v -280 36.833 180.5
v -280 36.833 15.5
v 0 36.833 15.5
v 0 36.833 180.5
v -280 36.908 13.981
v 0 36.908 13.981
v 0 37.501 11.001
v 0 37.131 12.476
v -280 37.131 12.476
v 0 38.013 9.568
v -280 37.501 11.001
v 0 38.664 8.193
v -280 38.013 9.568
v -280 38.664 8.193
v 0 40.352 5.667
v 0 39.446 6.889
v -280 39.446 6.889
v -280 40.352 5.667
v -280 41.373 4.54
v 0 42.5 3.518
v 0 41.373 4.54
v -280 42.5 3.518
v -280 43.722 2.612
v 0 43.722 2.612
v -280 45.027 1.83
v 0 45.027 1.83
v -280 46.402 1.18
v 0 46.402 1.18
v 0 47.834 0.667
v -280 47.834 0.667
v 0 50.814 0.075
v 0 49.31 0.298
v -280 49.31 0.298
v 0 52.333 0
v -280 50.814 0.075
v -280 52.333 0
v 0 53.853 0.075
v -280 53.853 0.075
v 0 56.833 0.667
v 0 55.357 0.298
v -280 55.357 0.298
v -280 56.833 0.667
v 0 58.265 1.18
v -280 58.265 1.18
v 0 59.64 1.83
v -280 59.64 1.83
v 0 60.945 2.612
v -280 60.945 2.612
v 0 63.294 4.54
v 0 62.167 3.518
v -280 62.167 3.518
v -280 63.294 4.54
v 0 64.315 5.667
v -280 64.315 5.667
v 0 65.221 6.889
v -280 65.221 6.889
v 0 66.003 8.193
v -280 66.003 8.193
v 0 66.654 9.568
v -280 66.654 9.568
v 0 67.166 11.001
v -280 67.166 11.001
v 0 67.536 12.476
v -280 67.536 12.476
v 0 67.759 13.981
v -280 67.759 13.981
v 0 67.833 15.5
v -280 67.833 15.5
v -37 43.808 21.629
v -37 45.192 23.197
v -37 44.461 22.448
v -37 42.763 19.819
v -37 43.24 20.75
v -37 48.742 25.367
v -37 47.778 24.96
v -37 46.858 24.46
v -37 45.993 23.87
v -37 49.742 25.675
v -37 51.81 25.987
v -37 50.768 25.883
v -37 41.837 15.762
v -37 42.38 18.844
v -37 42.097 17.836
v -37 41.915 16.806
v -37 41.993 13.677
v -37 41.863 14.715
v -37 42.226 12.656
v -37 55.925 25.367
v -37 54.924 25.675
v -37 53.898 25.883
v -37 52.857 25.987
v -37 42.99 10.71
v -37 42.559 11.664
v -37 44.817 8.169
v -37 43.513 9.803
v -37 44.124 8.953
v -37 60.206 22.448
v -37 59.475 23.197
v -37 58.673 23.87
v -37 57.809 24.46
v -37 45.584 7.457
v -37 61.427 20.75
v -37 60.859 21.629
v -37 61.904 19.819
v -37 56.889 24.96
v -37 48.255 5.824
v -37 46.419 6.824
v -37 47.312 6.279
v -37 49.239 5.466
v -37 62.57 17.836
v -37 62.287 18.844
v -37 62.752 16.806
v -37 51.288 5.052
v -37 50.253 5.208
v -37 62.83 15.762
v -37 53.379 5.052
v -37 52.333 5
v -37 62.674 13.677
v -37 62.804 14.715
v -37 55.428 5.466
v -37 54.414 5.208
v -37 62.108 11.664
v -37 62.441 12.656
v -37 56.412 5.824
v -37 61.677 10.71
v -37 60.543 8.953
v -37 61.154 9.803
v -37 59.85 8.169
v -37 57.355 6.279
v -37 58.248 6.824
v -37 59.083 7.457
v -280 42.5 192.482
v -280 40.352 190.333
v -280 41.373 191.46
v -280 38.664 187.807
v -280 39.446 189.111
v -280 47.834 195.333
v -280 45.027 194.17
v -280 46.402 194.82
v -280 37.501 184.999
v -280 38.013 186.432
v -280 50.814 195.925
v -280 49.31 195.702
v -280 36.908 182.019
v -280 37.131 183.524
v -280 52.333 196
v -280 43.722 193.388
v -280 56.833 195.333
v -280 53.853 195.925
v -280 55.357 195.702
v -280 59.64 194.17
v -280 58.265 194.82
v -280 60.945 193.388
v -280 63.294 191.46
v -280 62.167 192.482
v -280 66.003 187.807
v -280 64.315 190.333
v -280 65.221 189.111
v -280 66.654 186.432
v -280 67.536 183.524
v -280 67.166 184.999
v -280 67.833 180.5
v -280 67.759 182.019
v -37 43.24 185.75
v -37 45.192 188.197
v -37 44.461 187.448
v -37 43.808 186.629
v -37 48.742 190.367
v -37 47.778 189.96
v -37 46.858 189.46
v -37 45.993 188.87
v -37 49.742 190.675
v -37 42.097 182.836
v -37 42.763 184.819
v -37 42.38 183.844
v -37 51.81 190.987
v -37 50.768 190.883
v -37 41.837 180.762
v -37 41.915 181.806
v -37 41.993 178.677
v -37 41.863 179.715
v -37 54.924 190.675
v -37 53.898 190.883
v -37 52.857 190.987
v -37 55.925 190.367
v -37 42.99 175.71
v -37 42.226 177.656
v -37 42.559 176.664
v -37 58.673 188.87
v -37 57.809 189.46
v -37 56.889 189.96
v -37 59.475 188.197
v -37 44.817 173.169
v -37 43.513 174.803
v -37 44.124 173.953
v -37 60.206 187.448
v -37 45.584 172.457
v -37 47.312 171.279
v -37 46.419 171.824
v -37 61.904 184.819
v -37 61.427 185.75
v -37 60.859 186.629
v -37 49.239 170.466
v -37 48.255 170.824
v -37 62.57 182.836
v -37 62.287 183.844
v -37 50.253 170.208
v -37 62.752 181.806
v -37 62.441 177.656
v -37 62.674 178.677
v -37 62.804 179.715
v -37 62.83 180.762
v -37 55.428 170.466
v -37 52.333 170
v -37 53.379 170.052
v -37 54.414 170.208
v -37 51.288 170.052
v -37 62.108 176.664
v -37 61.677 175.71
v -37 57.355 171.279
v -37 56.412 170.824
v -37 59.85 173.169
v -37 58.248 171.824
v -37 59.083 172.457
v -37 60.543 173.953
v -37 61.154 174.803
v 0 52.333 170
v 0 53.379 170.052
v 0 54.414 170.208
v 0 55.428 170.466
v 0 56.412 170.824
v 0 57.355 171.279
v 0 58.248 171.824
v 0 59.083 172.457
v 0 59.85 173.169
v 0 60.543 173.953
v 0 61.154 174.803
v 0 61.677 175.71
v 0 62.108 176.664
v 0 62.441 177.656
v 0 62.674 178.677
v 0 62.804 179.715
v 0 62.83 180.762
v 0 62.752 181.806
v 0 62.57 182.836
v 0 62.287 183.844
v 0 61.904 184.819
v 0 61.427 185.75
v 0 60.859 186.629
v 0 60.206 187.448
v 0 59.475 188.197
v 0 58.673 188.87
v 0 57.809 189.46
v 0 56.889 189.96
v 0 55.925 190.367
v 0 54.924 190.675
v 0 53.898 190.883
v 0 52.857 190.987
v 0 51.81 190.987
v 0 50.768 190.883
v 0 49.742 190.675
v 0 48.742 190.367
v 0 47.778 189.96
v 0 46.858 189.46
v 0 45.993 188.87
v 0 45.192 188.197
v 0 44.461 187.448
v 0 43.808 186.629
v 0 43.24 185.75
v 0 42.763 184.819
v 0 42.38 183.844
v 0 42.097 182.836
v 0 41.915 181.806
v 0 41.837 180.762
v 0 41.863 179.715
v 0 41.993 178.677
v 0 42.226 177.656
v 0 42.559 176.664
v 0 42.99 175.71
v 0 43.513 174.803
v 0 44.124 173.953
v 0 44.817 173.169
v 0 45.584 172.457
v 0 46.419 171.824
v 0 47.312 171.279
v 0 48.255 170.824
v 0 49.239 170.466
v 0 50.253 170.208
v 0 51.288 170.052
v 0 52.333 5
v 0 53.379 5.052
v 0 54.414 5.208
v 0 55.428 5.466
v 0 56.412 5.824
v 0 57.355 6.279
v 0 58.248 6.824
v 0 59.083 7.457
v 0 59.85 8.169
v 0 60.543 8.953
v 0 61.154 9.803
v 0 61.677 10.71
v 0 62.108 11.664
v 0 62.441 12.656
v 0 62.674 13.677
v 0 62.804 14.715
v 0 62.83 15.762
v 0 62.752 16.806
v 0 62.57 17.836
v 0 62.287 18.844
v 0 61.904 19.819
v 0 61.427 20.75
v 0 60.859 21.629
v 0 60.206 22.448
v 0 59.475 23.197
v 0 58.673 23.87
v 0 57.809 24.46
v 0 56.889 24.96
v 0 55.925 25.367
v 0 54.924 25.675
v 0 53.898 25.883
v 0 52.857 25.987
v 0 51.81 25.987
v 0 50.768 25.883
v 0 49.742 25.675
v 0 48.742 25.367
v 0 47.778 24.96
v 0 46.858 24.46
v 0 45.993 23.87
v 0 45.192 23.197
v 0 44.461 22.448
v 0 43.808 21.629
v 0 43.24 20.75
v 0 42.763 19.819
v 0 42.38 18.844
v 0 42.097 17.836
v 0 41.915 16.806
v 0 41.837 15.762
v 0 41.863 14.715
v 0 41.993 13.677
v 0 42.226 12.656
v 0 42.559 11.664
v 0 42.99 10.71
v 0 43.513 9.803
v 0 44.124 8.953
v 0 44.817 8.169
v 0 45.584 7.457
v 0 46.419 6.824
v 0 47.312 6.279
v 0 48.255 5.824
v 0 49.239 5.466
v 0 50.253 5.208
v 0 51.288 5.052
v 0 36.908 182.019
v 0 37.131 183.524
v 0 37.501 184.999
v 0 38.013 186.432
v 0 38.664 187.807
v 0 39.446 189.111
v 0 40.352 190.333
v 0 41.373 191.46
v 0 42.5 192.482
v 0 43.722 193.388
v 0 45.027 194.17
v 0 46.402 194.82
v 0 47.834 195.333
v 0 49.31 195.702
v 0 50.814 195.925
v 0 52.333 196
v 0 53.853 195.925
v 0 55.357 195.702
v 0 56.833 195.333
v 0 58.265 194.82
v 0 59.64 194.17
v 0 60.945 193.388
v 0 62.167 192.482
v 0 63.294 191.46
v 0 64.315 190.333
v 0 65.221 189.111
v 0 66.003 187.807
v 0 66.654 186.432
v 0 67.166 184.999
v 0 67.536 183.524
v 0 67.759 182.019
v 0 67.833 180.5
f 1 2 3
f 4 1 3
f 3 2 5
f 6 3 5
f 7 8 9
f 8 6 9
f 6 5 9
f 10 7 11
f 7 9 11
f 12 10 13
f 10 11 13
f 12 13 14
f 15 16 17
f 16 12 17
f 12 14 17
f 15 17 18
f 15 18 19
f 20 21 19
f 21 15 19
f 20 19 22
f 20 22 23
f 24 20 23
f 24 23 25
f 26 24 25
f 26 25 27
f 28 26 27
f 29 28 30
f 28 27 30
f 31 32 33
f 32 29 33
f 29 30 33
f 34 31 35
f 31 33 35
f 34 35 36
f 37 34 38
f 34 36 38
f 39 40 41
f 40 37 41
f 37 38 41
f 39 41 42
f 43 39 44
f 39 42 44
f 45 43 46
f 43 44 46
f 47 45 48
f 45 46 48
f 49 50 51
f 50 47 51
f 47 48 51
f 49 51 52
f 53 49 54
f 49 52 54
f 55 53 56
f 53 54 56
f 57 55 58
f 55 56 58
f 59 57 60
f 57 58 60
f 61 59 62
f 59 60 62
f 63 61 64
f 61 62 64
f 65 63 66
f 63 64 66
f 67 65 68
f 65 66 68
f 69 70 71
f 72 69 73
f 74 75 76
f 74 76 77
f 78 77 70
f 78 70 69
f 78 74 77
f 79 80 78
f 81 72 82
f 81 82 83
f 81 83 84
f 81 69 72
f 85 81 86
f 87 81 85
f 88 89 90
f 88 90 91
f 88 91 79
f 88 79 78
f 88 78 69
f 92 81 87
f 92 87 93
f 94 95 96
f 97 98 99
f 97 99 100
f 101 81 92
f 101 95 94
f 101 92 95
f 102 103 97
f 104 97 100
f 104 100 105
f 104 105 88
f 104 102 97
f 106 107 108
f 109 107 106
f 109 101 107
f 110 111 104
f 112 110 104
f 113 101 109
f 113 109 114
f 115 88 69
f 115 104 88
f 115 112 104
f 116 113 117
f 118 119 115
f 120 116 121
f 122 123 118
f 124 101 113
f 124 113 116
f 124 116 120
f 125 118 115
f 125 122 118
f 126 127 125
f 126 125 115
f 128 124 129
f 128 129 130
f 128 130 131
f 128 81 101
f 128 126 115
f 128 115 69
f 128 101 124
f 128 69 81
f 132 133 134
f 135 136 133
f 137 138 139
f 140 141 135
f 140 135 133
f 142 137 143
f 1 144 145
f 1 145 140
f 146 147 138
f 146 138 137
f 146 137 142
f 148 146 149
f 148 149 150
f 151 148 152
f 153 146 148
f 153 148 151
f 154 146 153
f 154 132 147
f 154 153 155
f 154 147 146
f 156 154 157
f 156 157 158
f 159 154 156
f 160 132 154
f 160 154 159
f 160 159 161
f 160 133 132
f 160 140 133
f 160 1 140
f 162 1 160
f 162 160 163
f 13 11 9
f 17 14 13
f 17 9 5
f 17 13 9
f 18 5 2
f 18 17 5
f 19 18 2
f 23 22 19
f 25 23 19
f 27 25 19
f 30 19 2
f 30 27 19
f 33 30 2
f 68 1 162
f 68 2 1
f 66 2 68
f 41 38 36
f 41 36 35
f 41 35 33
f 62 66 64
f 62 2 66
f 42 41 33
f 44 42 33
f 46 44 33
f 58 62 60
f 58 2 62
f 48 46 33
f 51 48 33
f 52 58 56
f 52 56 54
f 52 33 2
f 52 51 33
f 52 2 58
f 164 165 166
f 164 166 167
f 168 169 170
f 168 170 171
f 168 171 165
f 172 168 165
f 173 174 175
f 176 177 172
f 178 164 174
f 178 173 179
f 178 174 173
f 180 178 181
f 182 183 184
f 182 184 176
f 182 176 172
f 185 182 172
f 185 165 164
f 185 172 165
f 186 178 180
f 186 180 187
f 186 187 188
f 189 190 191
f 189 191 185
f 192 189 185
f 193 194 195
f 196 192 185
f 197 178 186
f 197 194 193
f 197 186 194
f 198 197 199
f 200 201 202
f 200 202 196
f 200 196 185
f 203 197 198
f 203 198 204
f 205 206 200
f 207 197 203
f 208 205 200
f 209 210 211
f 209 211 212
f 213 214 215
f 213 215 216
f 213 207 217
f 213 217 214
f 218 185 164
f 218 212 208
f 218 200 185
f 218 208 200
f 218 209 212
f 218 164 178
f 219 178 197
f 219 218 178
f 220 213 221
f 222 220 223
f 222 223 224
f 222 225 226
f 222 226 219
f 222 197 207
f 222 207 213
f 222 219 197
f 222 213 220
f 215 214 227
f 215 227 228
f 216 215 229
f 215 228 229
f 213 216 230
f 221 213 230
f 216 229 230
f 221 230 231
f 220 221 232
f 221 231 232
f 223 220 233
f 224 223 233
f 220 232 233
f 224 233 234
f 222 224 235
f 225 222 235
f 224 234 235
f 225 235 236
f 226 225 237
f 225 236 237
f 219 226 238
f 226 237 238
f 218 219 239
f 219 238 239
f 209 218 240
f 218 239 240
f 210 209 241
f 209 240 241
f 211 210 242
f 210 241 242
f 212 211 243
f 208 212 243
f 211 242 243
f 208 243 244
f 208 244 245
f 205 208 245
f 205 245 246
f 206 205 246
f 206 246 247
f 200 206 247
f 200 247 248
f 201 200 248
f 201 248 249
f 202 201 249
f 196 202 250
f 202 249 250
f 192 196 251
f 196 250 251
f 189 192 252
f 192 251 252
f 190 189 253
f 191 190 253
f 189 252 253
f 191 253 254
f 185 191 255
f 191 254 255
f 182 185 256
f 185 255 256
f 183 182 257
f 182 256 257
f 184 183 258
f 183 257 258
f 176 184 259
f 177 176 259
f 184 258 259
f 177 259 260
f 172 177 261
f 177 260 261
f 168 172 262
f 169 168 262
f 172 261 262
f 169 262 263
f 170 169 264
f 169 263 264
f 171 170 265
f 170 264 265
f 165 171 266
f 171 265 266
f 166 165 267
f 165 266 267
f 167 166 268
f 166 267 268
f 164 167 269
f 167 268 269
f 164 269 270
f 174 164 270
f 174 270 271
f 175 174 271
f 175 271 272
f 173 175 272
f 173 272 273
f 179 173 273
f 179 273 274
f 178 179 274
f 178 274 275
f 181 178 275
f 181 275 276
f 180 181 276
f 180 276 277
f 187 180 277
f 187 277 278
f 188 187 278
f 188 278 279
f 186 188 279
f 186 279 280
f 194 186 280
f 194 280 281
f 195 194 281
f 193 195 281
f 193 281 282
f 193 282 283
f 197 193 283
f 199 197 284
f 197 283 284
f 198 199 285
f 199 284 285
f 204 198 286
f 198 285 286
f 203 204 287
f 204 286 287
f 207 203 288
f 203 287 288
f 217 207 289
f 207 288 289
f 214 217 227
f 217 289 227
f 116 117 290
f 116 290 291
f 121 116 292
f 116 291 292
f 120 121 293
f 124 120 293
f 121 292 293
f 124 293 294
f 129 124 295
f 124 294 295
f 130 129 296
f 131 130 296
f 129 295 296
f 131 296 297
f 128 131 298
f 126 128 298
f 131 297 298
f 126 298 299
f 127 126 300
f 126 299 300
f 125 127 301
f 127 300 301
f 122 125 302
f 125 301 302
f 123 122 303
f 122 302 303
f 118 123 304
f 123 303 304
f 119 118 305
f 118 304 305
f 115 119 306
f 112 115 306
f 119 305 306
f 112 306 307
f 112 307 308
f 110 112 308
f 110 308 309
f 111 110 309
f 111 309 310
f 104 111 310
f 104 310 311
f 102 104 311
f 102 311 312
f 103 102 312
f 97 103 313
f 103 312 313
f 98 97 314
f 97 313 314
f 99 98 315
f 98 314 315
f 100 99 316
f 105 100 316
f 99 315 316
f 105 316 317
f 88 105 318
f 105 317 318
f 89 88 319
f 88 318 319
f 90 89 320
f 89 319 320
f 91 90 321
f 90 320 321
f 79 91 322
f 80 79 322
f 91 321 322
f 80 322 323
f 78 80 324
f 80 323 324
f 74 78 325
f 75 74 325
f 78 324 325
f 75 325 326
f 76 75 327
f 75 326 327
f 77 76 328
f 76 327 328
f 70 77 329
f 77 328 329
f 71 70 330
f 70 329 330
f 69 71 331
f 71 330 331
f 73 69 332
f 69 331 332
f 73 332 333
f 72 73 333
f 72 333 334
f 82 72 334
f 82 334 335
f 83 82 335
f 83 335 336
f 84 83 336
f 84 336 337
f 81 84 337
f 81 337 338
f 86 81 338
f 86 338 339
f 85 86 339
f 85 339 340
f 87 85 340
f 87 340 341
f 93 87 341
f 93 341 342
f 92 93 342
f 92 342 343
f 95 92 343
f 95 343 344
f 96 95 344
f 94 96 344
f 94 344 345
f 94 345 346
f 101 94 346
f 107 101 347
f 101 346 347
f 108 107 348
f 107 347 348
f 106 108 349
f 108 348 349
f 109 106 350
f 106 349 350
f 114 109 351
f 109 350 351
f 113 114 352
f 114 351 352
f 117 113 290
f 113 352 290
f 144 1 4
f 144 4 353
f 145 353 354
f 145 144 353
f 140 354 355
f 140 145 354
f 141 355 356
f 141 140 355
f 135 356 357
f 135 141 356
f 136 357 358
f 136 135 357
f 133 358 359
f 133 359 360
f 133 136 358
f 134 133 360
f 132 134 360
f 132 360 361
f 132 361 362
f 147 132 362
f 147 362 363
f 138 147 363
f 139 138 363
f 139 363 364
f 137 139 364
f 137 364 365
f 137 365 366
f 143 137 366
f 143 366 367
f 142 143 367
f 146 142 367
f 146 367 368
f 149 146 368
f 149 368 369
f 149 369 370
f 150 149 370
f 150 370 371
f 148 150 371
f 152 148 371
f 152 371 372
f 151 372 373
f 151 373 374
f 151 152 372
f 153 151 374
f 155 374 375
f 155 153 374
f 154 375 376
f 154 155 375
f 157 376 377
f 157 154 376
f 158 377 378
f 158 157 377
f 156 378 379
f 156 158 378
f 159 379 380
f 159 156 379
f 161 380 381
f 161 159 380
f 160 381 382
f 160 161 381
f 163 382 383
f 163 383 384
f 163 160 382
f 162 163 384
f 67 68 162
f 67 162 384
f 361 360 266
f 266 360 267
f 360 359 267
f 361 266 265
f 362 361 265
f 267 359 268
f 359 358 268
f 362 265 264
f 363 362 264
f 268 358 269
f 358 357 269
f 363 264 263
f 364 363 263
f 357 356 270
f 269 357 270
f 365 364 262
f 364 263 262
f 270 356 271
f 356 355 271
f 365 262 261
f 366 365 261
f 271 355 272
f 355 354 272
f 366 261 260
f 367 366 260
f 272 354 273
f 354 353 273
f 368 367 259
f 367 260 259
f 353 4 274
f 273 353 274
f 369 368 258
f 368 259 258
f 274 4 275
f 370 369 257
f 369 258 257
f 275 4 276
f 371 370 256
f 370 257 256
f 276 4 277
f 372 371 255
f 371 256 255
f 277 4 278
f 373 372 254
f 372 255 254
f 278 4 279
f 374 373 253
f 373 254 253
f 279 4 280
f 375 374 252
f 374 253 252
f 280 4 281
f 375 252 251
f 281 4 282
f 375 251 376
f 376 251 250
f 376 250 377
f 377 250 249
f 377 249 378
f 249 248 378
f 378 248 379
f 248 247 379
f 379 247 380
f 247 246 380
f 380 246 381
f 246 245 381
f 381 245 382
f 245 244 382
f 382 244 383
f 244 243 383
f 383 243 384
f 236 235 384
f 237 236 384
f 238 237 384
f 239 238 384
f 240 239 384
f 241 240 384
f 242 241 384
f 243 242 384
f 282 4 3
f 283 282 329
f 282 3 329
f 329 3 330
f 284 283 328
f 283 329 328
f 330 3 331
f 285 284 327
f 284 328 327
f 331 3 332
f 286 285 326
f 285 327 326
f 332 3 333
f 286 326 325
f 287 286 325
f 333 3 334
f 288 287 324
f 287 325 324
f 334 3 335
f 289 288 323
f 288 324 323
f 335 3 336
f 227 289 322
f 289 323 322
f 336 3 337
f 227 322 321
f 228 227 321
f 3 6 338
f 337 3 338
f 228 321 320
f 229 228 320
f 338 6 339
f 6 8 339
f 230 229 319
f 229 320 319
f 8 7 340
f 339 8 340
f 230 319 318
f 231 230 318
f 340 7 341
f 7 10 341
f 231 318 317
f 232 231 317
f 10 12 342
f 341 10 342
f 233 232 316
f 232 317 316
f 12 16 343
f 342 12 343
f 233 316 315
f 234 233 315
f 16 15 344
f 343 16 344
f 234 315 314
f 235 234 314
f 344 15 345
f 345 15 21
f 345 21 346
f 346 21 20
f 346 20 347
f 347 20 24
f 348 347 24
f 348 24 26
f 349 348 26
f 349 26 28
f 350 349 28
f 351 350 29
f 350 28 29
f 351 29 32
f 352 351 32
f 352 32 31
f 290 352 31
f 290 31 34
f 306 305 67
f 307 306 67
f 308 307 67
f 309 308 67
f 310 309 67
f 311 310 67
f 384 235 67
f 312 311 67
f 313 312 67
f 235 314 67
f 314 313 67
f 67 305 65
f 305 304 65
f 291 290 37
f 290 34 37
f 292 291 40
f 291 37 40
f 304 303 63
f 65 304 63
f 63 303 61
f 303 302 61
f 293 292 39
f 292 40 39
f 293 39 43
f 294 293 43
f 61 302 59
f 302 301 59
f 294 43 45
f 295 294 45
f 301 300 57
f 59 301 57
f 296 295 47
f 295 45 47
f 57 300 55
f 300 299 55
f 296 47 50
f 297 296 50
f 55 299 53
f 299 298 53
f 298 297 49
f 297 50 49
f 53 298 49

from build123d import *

# Parameters (mm, degrees)
SKETCH3_W               = 280
SKETCH3_H               = 31
BOSS_EXTRUDE1_DEPTH     = 196
CUT_EXTRUDE1_DEPTH      = 349.449961347
CUT_EXTRUDE1_DEPTH_BACK = 349.449961347
SKETCH6_R               = 10.5
CUT_EXTRUDE2_DEPTH      = 37


with BuildPart() as part:
    # Sketch3 → Boss-Extrude1 (new body)
    with BuildSketch(Plane.XY):
        with Locations((-140, 52.333439857)):
            Rectangle(SKETCH3_W, SKETCH3_H)
    extrude(amount=BOSS_EXTRUDE1_DEPTH)

    # Sketch4 → Cut-Extrude1 (cut, two sides: drawn at the far end of the back side and taken through both)
    with BuildSketch(Plane(origin=(0, 0, 0), x_dir=(0, 0, -1), z_dir=(1, 0, 0)).offset(-CUT_EXTRUDE1_DEPTH_BACK)):
        with BuildLine():
            Line((-180.5, 67.833439857), (-180.5, 68.833439857))
            Line((-180.5, 68.833439857), (-197, 68.833439857))
            Line((-197, 68.833439857), (-197, 35.833439857))
            Line((-197, 35.833439857), (-180.5, 35.833439857))
            Line((-180.5, 35.833439857), (-180.5, 36.833439857))
            ThreePointArc((-180.5, 36.833439857), (-196, 52.333439857), (-180.5, 67.833439857))
        make_face()
        with BuildLine():
            Line((-15.5, 67.833439857), (-15.5, 68.833439857))
            Line((-15.5, 68.833439857), (1, 68.833439857))
            Line((1, 68.833439857), (1, 35.833439857))
            Line((1, 35.833439857), (-15.5, 35.833439857))
            Line((-15.5, 35.833439857), (-15.5, 36.833439857))
            ThreePointArc((-15.5, 36.833439857), (0, 52.333439857), (-15.5, 67.833439857))
        make_face()
    extrude(amount=CUT_EXTRUDE1_DEPTH + CUT_EXTRUDE1_DEPTH_BACK, mode=Mode.SUBTRACT)

    # Sketch6 → Cut-Extrude2 (cut)
    with BuildSketch(Plane(origin=(0, 0, 0), x_dir=(0, 0, -1), z_dir=(1, 0, 0))):
        with Locations((-180.5, 52.333439857)):
            Circle(SKETCH6_R)
        with Locations((-15.5, 52.333439857)):
            Circle(SKETCH6_R)
    extrude(amount=-CUT_EXTRUDE2_DEPTH, mode=Mode.SUBTRACT)


solid = part.part
